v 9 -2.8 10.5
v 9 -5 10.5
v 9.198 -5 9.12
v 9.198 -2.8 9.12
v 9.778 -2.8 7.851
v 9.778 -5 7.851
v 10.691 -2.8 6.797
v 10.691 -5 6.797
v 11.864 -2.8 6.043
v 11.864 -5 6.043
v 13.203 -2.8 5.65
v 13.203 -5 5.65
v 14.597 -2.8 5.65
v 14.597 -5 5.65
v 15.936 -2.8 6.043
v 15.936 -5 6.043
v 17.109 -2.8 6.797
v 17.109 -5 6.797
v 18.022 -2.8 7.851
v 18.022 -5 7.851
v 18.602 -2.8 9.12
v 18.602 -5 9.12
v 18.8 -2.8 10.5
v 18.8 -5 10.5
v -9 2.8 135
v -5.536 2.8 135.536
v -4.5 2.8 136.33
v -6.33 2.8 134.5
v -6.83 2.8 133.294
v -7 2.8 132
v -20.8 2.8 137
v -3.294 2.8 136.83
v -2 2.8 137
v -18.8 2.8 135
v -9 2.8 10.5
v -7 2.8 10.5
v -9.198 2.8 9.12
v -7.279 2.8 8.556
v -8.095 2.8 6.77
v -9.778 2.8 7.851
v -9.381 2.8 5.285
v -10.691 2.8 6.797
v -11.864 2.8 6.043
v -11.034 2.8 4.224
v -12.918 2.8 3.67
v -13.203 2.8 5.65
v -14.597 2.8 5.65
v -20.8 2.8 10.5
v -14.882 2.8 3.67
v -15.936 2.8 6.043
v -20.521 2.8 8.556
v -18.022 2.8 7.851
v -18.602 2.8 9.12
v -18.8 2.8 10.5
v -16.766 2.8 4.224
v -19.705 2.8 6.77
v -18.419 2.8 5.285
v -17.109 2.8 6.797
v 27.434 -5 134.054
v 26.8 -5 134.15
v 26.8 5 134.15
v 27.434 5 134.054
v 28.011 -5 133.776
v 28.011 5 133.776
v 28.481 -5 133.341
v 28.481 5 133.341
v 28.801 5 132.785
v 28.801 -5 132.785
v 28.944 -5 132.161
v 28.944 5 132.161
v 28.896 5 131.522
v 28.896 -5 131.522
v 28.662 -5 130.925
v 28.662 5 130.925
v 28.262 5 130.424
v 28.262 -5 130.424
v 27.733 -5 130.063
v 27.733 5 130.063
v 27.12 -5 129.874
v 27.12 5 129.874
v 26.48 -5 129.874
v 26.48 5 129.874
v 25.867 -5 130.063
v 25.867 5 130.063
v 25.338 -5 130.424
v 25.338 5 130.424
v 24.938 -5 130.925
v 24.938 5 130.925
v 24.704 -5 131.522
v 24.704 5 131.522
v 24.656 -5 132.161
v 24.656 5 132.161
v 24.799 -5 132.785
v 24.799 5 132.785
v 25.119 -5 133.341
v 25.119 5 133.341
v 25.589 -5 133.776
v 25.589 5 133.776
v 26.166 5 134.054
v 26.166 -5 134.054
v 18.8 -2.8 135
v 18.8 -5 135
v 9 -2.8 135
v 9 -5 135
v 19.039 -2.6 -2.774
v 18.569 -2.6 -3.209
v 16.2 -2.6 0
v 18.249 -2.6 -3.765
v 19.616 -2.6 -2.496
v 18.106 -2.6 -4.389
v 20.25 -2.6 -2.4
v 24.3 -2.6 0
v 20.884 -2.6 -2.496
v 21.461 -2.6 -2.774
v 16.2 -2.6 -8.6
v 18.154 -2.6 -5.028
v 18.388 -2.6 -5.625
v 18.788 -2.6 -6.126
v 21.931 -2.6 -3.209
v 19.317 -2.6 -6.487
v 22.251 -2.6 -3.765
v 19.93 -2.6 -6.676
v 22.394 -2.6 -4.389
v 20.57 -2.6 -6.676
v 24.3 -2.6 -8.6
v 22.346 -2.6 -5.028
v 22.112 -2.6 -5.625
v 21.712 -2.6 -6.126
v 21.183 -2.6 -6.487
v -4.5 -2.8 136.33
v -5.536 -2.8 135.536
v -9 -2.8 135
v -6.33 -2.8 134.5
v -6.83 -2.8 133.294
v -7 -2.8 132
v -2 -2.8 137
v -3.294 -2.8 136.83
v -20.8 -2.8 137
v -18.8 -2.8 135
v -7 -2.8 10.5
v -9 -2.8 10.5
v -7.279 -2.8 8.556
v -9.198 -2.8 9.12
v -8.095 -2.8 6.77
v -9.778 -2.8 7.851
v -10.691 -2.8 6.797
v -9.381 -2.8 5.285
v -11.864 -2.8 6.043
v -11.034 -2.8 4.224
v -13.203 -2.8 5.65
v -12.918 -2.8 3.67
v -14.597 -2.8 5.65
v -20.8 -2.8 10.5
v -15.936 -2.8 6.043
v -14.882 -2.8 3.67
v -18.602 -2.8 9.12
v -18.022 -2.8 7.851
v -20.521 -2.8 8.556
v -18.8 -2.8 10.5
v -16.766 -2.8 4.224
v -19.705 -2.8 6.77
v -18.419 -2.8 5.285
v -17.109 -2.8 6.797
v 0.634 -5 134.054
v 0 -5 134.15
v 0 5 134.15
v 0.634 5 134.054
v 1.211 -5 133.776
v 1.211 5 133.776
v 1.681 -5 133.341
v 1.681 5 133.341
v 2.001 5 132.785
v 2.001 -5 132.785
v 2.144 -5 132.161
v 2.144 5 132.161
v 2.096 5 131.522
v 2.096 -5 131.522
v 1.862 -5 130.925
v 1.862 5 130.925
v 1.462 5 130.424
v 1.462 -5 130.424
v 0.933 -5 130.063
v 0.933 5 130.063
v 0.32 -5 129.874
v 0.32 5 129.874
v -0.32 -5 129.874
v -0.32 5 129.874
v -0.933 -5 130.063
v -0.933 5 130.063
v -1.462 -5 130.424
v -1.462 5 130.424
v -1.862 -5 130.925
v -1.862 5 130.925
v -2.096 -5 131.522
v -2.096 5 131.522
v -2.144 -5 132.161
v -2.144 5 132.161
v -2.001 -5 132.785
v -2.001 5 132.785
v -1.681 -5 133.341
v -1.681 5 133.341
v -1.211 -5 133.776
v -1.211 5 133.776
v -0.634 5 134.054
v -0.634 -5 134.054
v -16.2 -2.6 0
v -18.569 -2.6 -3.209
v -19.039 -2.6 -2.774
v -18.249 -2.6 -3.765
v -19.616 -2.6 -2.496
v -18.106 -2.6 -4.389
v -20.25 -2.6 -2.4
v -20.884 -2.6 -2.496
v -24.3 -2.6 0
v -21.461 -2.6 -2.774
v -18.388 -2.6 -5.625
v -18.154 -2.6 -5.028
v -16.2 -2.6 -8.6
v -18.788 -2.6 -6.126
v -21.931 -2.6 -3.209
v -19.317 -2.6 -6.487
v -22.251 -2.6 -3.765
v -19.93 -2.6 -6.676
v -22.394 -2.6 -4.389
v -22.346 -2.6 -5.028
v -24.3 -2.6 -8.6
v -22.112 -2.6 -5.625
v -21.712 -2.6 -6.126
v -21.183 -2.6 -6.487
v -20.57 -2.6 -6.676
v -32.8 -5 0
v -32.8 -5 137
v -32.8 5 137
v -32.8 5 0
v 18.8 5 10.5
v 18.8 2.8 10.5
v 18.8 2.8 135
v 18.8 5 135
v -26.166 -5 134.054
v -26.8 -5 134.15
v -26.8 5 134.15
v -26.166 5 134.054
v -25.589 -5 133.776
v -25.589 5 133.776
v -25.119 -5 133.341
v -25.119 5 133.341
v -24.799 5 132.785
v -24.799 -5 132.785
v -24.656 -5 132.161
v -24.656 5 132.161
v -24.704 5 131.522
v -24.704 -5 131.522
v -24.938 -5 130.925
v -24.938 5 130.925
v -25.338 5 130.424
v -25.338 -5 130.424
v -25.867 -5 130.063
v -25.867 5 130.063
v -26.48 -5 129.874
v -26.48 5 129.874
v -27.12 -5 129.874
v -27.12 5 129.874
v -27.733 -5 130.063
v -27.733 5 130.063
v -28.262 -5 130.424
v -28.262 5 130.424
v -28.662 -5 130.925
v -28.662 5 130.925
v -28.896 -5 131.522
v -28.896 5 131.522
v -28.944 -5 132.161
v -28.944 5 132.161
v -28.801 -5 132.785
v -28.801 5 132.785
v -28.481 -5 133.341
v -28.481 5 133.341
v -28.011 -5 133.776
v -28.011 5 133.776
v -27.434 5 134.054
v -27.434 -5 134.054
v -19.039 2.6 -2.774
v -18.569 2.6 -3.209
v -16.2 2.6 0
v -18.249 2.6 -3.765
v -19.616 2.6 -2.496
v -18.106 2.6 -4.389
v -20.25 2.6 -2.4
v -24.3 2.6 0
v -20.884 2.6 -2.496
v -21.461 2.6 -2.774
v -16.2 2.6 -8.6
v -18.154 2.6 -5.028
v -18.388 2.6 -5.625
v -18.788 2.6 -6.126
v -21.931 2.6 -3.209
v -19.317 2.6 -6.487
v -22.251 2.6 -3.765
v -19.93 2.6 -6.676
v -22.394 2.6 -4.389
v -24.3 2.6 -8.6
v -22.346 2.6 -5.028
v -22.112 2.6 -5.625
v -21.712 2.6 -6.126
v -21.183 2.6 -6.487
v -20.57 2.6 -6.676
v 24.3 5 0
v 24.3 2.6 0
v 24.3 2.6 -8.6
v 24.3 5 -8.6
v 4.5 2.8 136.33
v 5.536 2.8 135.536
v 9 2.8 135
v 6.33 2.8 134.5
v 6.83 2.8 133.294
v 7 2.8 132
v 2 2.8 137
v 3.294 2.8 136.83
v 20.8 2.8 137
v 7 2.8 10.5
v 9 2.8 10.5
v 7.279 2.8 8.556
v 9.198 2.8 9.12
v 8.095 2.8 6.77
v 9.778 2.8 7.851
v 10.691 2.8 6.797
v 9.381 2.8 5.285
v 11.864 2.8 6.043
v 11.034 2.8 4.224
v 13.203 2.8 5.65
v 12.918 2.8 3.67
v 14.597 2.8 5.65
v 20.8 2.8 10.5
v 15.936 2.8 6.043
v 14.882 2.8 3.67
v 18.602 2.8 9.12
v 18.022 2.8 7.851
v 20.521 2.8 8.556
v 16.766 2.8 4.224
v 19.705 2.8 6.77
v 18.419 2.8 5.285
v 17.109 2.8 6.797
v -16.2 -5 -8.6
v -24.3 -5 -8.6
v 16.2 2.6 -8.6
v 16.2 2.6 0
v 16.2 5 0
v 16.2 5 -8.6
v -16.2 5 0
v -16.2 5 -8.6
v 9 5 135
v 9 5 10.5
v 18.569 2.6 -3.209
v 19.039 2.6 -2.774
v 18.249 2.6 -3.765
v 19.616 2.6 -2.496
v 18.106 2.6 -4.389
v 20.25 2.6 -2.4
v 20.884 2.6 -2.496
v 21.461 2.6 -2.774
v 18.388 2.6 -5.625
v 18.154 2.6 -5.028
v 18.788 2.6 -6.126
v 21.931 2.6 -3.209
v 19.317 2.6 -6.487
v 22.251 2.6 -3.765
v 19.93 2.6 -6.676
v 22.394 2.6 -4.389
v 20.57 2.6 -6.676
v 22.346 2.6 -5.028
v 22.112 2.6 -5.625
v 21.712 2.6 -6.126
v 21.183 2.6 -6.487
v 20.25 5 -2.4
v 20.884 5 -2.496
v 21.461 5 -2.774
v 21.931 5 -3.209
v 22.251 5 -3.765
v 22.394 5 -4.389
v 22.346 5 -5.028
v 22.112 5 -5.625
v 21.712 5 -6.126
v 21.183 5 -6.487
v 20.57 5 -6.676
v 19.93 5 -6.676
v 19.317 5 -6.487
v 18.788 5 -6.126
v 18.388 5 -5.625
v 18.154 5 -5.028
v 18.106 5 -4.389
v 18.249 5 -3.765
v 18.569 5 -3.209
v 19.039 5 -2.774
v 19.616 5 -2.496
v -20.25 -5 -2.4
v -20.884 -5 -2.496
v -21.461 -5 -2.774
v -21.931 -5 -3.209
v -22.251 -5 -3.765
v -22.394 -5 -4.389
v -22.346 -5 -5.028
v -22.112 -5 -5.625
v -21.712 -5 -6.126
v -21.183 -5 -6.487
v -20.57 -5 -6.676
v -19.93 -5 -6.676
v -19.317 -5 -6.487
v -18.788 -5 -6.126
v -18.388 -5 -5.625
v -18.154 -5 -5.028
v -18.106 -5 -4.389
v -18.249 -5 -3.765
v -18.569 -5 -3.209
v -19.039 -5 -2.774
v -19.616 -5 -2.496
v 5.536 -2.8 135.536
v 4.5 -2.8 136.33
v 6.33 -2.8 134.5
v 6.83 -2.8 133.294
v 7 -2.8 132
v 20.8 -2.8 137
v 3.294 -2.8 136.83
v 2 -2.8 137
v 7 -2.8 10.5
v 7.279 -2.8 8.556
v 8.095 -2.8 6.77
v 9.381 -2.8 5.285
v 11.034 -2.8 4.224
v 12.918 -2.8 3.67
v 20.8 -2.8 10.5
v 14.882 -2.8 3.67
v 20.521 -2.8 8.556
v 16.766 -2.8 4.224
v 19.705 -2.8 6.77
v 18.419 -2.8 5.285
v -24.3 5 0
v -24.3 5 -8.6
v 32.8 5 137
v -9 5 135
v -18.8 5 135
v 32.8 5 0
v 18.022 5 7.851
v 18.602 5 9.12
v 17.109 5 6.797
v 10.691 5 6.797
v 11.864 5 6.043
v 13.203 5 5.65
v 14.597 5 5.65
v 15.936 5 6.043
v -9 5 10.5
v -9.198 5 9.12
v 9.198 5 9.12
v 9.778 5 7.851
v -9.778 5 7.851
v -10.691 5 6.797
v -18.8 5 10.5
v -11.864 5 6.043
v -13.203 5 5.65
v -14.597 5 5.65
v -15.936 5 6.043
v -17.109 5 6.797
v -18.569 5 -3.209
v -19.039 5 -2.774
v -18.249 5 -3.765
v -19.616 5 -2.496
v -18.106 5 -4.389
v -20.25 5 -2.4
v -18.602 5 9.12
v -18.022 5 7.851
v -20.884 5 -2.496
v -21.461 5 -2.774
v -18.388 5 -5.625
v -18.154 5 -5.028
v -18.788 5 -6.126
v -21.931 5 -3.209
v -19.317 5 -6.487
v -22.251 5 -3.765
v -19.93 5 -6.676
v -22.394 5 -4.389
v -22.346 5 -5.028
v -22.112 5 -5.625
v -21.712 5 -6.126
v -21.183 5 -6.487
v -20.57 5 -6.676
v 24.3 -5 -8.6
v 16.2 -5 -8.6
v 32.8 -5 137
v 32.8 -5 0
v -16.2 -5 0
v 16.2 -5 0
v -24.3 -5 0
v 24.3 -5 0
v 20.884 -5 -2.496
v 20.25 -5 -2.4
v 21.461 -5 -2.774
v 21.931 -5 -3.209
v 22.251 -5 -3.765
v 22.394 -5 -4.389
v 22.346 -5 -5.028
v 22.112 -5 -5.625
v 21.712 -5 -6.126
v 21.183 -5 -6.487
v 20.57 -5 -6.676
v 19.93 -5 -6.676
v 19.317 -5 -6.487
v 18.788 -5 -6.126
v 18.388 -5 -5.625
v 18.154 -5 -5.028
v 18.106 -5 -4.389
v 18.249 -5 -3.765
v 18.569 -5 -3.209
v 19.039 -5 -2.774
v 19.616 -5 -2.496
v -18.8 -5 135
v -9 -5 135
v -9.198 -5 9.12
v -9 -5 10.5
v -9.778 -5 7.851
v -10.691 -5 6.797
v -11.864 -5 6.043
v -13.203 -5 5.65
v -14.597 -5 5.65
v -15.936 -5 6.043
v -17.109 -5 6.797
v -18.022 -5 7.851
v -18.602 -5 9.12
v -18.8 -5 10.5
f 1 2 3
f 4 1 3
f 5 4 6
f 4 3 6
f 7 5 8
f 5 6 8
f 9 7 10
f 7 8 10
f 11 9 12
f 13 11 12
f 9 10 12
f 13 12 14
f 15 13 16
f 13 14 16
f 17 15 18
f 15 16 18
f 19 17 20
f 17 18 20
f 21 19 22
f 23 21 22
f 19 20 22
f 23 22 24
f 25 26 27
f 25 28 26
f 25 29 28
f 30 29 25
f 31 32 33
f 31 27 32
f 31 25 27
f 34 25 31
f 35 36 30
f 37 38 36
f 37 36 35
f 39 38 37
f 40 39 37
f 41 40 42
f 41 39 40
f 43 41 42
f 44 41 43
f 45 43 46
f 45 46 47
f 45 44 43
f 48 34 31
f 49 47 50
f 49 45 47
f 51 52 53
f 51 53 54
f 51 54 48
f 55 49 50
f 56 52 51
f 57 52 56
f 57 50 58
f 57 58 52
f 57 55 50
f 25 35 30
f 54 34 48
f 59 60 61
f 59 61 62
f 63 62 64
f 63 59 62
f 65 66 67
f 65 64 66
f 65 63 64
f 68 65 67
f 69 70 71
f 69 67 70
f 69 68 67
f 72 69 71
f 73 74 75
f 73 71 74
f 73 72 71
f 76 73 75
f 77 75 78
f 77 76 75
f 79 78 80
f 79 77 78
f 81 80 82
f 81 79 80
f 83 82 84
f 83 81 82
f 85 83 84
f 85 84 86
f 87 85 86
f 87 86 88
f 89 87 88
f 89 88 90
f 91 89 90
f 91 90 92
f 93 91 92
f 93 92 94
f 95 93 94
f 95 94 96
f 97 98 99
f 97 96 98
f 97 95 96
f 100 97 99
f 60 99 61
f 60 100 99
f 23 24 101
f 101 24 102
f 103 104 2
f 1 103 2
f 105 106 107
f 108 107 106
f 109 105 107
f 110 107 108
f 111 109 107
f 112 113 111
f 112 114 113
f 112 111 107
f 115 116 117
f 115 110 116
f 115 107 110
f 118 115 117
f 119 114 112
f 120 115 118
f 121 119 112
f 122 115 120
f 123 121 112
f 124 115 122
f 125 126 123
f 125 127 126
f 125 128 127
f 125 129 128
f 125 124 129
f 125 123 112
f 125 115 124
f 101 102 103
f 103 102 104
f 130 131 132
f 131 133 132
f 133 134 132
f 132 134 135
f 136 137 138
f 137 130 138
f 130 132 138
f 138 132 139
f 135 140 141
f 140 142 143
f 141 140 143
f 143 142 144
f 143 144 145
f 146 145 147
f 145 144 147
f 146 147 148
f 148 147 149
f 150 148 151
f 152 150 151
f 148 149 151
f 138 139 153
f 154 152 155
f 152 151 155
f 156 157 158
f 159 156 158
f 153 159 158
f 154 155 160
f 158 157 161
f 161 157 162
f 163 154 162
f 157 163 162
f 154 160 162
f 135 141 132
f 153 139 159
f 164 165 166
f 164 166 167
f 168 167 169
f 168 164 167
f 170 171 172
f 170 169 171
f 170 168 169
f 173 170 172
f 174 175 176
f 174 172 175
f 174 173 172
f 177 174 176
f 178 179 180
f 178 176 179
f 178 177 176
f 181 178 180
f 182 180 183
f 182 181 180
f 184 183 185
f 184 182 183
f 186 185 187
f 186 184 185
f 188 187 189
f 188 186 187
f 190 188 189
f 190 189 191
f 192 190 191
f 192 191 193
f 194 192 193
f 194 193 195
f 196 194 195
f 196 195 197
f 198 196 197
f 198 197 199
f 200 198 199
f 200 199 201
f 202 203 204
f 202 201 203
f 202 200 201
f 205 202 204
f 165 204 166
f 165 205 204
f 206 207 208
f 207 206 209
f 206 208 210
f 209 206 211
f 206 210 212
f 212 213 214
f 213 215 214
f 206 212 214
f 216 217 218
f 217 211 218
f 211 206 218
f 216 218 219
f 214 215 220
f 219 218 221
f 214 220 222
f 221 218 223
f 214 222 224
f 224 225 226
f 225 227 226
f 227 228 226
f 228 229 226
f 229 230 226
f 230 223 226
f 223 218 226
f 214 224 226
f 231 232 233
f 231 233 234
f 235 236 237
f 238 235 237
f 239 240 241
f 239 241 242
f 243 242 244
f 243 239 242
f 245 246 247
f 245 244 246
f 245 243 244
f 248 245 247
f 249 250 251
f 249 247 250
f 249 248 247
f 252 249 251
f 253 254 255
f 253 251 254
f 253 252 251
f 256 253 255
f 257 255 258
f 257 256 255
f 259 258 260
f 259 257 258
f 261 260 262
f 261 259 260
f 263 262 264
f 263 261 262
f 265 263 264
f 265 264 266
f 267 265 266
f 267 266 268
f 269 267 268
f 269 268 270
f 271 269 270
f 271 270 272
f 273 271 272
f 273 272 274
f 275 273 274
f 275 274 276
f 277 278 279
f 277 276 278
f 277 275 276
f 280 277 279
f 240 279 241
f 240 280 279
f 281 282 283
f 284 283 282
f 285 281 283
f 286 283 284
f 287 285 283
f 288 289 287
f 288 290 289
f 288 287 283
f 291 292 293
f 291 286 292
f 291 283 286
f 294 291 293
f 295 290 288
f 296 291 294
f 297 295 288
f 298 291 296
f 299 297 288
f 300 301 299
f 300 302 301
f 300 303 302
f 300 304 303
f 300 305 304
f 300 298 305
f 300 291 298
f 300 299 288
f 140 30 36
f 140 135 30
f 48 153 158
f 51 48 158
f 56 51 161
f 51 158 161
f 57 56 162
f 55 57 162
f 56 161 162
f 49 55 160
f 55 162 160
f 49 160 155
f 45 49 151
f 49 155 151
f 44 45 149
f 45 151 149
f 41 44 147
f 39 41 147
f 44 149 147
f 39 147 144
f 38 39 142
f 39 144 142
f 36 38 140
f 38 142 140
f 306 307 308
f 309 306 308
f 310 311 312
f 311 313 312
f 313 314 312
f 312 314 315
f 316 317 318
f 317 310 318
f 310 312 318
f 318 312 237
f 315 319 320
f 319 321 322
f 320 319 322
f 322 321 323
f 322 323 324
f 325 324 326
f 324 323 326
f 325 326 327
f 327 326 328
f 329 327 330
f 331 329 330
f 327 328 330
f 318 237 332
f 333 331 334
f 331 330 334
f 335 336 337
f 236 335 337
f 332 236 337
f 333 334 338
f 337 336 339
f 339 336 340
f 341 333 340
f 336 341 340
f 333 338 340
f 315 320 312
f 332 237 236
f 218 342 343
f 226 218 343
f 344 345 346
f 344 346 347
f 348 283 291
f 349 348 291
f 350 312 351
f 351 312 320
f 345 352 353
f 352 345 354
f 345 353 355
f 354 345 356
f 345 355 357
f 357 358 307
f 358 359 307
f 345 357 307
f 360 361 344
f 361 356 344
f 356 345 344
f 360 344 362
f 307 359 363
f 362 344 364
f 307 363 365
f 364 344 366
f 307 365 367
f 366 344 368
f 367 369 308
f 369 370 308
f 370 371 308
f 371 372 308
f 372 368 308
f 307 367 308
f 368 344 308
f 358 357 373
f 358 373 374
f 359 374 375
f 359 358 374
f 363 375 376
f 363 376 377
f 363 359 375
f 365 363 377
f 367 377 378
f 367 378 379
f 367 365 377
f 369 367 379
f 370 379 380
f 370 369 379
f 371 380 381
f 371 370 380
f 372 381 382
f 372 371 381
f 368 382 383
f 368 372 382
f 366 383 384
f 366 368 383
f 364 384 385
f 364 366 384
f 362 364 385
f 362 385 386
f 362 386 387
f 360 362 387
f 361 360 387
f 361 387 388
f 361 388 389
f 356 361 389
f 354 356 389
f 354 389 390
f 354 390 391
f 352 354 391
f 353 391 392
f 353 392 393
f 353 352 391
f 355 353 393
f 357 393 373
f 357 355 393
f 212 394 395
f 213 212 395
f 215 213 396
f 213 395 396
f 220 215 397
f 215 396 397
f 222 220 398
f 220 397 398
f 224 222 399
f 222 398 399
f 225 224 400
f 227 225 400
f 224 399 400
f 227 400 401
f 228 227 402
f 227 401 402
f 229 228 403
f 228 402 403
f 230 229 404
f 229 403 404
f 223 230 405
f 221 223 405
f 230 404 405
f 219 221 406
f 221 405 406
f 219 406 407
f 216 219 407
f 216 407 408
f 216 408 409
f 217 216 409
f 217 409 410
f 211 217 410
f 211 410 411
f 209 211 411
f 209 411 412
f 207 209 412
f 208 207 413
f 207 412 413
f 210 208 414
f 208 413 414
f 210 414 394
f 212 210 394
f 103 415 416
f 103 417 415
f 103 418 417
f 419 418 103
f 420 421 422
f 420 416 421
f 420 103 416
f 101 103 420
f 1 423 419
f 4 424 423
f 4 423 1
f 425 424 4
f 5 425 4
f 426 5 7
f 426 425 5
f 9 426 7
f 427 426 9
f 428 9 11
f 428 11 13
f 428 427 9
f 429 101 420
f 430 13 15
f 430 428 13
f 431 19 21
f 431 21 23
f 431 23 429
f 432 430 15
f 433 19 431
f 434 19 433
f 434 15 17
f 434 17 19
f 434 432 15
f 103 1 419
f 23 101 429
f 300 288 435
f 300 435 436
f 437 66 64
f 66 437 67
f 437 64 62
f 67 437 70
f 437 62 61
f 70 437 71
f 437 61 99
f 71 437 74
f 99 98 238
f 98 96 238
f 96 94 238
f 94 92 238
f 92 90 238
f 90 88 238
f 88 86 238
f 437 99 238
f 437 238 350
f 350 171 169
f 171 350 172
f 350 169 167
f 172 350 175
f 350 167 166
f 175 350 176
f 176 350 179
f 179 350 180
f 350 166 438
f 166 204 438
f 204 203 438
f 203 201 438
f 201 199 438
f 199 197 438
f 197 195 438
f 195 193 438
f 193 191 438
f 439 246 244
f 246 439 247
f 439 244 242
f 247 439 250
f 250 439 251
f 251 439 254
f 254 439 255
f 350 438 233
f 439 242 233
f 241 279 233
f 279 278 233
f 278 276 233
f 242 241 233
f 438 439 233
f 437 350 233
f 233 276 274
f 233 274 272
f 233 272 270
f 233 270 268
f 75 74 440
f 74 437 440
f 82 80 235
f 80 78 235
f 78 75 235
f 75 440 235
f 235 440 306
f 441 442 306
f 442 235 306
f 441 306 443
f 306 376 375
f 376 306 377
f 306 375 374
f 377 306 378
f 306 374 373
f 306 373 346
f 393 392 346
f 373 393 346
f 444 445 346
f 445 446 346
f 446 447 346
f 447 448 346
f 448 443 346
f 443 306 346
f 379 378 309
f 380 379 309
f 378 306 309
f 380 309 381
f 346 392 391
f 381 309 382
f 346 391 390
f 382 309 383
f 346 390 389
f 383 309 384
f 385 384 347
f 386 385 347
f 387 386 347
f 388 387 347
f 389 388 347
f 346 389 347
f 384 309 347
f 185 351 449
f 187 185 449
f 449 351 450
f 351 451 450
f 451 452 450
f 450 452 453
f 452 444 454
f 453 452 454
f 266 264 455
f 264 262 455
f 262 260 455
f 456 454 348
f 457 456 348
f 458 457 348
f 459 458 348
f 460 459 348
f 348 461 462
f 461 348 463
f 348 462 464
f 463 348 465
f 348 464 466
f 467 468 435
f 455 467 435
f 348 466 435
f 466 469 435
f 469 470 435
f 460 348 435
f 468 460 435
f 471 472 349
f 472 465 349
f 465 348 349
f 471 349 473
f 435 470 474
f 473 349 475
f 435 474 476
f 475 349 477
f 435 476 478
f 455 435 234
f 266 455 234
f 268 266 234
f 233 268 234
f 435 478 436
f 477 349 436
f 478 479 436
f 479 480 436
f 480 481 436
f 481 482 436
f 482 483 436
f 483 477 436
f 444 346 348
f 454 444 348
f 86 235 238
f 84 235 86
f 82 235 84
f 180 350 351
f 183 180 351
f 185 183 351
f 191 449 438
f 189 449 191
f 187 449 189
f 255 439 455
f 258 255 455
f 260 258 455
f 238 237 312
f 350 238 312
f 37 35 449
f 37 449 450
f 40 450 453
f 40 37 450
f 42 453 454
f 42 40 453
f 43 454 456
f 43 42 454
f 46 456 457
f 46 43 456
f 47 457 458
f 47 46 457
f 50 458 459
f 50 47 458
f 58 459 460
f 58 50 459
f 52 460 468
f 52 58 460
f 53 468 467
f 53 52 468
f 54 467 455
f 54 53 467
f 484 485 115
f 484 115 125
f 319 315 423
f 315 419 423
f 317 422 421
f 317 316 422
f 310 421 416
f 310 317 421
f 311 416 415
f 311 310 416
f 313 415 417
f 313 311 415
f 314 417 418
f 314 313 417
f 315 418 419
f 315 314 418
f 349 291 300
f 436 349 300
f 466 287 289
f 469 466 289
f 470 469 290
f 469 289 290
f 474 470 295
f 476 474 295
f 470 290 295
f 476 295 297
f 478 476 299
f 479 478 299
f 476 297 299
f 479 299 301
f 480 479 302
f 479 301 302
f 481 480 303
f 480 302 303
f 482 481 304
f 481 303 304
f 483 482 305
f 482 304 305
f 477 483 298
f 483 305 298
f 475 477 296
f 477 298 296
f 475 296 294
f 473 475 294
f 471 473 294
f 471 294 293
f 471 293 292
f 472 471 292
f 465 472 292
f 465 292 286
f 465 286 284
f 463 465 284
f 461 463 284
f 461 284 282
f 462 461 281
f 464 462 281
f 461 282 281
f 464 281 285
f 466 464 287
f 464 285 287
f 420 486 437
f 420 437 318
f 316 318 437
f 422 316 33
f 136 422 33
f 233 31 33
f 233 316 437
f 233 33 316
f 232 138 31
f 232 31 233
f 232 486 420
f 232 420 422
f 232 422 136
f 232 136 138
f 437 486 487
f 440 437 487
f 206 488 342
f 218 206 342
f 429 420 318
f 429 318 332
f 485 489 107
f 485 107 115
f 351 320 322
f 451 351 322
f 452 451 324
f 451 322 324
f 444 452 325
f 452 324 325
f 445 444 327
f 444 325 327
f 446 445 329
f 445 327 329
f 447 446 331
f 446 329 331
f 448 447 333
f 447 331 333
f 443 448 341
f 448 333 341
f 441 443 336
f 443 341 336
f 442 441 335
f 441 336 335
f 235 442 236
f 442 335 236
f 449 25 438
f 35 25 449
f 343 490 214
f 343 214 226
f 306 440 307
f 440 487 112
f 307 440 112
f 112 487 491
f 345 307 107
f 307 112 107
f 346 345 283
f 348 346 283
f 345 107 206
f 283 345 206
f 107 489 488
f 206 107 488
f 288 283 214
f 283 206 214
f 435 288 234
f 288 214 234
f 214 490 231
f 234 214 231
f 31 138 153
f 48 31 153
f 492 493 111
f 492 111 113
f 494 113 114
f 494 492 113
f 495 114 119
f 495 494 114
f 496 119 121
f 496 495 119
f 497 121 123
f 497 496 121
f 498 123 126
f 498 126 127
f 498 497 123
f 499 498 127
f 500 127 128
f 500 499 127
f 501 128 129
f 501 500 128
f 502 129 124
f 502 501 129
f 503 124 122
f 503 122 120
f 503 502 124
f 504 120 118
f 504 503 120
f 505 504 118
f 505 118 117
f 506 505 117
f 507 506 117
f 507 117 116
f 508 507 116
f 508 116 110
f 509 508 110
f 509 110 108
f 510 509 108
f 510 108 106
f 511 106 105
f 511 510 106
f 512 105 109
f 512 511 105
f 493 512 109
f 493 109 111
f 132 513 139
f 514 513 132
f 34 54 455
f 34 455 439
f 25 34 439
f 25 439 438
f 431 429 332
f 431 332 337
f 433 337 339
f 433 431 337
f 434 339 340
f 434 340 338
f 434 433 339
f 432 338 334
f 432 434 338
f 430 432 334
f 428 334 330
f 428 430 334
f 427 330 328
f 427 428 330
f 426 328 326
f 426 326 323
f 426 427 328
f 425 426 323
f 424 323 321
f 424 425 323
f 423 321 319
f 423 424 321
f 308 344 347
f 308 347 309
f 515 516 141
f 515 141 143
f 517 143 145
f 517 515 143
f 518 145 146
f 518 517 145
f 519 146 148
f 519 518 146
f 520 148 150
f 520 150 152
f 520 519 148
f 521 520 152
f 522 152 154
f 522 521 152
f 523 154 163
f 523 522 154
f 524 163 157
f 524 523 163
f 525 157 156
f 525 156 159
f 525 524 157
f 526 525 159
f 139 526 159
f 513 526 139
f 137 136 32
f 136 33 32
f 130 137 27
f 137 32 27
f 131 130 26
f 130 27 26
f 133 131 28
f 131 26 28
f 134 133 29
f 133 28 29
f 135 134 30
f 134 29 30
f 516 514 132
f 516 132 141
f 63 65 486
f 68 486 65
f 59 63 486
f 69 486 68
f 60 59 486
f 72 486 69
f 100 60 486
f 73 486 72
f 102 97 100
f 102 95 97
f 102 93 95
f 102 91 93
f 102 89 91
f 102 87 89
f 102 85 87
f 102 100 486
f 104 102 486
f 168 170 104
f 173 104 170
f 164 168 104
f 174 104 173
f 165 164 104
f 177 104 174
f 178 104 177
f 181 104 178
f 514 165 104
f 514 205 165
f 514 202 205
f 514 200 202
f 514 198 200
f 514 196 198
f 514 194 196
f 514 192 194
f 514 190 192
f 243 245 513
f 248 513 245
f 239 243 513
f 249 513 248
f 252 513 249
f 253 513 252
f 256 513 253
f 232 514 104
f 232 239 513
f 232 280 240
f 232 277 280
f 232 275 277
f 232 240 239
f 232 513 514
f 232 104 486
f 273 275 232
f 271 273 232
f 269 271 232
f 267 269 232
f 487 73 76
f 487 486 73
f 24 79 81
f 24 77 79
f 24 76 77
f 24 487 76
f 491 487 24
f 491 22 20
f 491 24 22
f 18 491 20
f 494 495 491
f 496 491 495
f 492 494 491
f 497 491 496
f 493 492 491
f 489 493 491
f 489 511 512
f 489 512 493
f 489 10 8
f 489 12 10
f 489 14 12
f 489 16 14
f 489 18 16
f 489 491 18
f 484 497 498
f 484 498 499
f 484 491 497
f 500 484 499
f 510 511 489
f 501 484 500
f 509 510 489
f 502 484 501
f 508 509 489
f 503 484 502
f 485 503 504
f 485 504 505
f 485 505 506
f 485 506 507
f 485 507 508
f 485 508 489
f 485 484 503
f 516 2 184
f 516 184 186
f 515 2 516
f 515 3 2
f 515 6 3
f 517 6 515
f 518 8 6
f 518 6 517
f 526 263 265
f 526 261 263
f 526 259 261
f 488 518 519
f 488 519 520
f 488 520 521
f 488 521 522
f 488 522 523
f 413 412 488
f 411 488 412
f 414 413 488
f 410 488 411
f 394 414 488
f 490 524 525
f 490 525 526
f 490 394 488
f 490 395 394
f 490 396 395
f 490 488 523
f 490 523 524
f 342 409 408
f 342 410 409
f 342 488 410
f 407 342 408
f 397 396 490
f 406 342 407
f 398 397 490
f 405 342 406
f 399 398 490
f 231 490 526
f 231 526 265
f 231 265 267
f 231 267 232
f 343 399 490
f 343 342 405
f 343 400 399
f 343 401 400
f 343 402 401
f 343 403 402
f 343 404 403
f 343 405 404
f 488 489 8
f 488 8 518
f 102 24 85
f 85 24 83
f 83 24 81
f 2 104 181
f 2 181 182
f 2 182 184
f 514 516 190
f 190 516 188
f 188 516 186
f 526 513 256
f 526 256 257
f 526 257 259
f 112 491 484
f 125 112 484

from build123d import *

# Parameters (mm, degrees)
BOSS_EXTRUDE1_DEPTH      = 5
BOSS_EXTRUDE1_DEPTH_BACK = 5
SKETCH1_W                = 32.8
SKETCH1_H                = 137
CUT_EXTRUDE1_DEPTH       = 2.8
CUT_EXTRUDE1_DEPTH_BACK  = 2.8
SKETCH1_4_R              = 4.9
CUT_EXTRUDE3_DEPTH       = 2.8
CUT_EXTRUDE3_DEPTH_BACK  = 2.8
SKETCH1_8_W              = 2
SKETCH1_8_H              = 2
SKETCH1_8_W_2            = 9.8
BOSS_EXTRUDE2_START      = 2.6
SKETCH1_5_W              = 8.1
SKETCH1_5_H              = 8.6
SKETCH1_5_R              = 2.15
BOSS_EXTRUDE2_DEPTH      = 2.4
BOSS_EXTRUDE3_START      = -5
SKETCH1_6_W              = 8.1
SKETCH1_6_H              = 8.6
SKETCH1_6_R              = 2.15
BOSS_EXTRUDE3_DEPTH      = 2.4
FILLET1_R                = 5
CUT_EXTRUDE4_DEPTH       = 141.960419977
CUT_EXTRUDE4_DEPTH_BACK  = 141.960419977
SKETCH3_R                = 2.15


with BuildPart() as part:
    # Sketch1 → Boss-Extrude1 (new, two sides: drawn at the far end of the back side and taken through both)
    with BuildSketch(Plane(origin=(0, 0, 0), x_dir=(1, 0, 0), z_dir=(0, 1, 0)).offset(-BOSS_EXTRUDE1_DEPTH_BACK)):
        with Locations((16.4, -68.5)):
            Rectangle(SKETCH1_W, SKETCH1_H)
        with BuildLine():
            Line((9, -135), (9, -10.5))
            ThreePointArc((9, -10.5), (13.9, -5.6), (18.8, -10.5))
            Line((18.8, -10.5), (18.8, -135))
            Line((18.8, -135), (9, -135))
        make_face(mode=Mode.SUBTRACT)
    extrude(amount=BOSS_EXTRUDE1_DEPTH + BOSS_EXTRUDE1_DEPTH_BACK)

    # Sketch1<4> → Cut-Extrude1 (cut, two sides: drawn at the far end of the back side and taken through both)
    with BuildSketch(Plane(origin=(0, 0, 0), x_dir=(1, 0, 0), z_dir=(0, 1, 0)).offset(-CUT_EXTRUDE1_DEPTH_BACK)):
        with BuildLine():
            Line((7, -10.5), (7, -135))
            Line((7, -135), (9, -135))
            Line((9, -135), (9, -15.357983121))
            ThreePointArc((9, -15.357983121), (7.519561144, -13.126785107), (7, -10.5))
        make_face()
        with BuildLine():
            Line((18.8, -135), (20.8, -135))
            Line((20.8, -135), (20.8, -10.5))
            ThreePointArc((20.8, -10.5), (20.280438856, -13.126785107), (18.8, -15.357983121))
            Line((18.8, -15.357983121), (18.8, -135))
        make_face()
        with BuildLine():
            Line((9, -15.357983121), (9, -135))
            Line((9, -135), (18.8, -135))
            Line((18.8, -135), (18.8, -15.357983121))
            ThreePointArc((18.8, -15.357983121), (13.9, -17.4), (9, -15.357983121))
        make_face()
        with BuildLine():
            ThreePointArc((20.8, -10.5), (13.9, -3.6), (7, -10.5))
            ThreePointArc((7, -10.5), (7.519561144, -13.126785107), (9, -15.357983121))
            Line((9, -15.357983121), (9, -10.5))
            ThreePointArc((9, -10.5), (13.9, -5.6), (18.8, -10.5))
            Line((18.8, -10.5), (18.8, -15.357983121))
            ThreePointArc((18.8, -15.357983121), (20.280438856, -13.126785107), (20.8, -10.5))
        make_face()
        with BuildLine():
            Line((9, -10.5), (9, -15.357983121))
            ThreePointArc((9, -15.357983121), (13.9, -17.4), (18.8, -15.357983121))
            Line((18.8, -15.357983121), (18.8, -10.5))
            ThreePointArc((18.8, -10.5), (13.9, -15.4), (9, -10.5))
        make_face()
        with Locations((13.9, -10.5)):
            Circle(SKETCH1_4_R)
    extrude(amount=CUT_EXTRUDE1_DEPTH + CUT_EXTRUDE1_DEPTH_BACK, mode=Mode.SUBTRACT)

    # Sketch1<8> → Cut-Extrude3 (cut, two sides: drawn at the far end of the back side and taken through both)
    with BuildSketch(Plane(origin=(0, 0, 0), x_dir=(1, 0, 0), z_dir=(0, 1, 0)).offset(-CUT_EXTRUDE3_DEPTH_BACK)):
        with Locations((8, -136)):
            Rectangle(SKETCH1_8_W, SKETCH1_8_H)
        with Locations((19.8, -136)):
            Rectangle(SKETCH1_8_W, SKETCH1_8_H)
        with Locations((13.9, -136)):
            Rectangle(SKETCH1_8_W_2, SKETCH1_8_H)
    extrude(amount=CUT_EXTRUDE3_DEPTH + CUT_EXTRUDE3_DEPTH_BACK, mode=Mode.SUBTRACT)

    # Sketch1<5> → Boss-Extrude2 (add)
    with BuildSketch(Plane(origin=(0, 0, 0), x_dir=(1, 0, 0), z_dir=(0, 1, 0)).offset(BOSS_EXTRUDE2_START)):
        with Locations((20.25, 4.3)):
            Rectangle(SKETCH1_5_W, SKETCH1_5_H)
        with Locations(Location((20.25, 4.55, 0), (0, 0, 270))):
            Circle(SKETCH1_5_R, mode=Mode.SUBTRACT)
    extrude(amount=BOSS_EXTRUDE2_DEPTH)

    # Sketch1<6> → Boss-Extrude3 (add)
    with BuildSketch(Plane(origin=(0, 0, 0), x_dir=(1, 0, 0), z_dir=(0, 1, 0)).offset(BOSS_EXTRUDE3_START)):
        with Locations((20.25, 4.3)):
            Rectangle(SKETCH1_6_W, SKETCH1_6_H)
        with Locations(Location((20.25, 4.55, 0), (0, 0, 270))):
            Circle(SKETCH1_6_R, mode=Mode.SUBTRACT)
    extrude(amount=BOSS_EXTRUDE3_DEPTH)

    # Mirror1: part across plane


with BuildPart() as part_1:
    add(part.part)
    add(part.part.mirror(Plane(origin=(0, 0, 0), x_dir=(0, 0, 1), z_dir=(1, 0, 0))))

    # Fillet1
    fillet1_edges = [part_1.edges().sort_by_distance(p)[0] for p in [
        (-7, 0, 137),
        (7, 0, 137),
    ]]
    fillet(fillet1_edges, radius=FILLET1_R)

    # Sketch3 → Cut-Extrude4 (cut, two sides: drawn at the far end of the back side and taken through both)
    with BuildSketch(Plane(origin=(0, 0, 0), x_dir=(1, 0, 0), z_dir=(0, 1, 0)).offset(-CUT_EXTRUDE4_DEPTH_BACK)):
        with Locations(Location((0, -132, 0), (0, 0, 270))):
            Circle(SKETCH3_R)
        with Locations(Location((26.8, -132, 0), (0, 0, 270))):
            Circle(SKETCH3_R)
        with Locations(Location((-26.8, -132, 0), (0, 0, 270))):
            Circle(SKETCH3_R)
    extrude(amount=CUT_EXTRUDE4_DEPTH + CUT_EXTRUDE4_DEPTH_BACK, mode=Mode.SUBTRACT)


solid = part_1.part
